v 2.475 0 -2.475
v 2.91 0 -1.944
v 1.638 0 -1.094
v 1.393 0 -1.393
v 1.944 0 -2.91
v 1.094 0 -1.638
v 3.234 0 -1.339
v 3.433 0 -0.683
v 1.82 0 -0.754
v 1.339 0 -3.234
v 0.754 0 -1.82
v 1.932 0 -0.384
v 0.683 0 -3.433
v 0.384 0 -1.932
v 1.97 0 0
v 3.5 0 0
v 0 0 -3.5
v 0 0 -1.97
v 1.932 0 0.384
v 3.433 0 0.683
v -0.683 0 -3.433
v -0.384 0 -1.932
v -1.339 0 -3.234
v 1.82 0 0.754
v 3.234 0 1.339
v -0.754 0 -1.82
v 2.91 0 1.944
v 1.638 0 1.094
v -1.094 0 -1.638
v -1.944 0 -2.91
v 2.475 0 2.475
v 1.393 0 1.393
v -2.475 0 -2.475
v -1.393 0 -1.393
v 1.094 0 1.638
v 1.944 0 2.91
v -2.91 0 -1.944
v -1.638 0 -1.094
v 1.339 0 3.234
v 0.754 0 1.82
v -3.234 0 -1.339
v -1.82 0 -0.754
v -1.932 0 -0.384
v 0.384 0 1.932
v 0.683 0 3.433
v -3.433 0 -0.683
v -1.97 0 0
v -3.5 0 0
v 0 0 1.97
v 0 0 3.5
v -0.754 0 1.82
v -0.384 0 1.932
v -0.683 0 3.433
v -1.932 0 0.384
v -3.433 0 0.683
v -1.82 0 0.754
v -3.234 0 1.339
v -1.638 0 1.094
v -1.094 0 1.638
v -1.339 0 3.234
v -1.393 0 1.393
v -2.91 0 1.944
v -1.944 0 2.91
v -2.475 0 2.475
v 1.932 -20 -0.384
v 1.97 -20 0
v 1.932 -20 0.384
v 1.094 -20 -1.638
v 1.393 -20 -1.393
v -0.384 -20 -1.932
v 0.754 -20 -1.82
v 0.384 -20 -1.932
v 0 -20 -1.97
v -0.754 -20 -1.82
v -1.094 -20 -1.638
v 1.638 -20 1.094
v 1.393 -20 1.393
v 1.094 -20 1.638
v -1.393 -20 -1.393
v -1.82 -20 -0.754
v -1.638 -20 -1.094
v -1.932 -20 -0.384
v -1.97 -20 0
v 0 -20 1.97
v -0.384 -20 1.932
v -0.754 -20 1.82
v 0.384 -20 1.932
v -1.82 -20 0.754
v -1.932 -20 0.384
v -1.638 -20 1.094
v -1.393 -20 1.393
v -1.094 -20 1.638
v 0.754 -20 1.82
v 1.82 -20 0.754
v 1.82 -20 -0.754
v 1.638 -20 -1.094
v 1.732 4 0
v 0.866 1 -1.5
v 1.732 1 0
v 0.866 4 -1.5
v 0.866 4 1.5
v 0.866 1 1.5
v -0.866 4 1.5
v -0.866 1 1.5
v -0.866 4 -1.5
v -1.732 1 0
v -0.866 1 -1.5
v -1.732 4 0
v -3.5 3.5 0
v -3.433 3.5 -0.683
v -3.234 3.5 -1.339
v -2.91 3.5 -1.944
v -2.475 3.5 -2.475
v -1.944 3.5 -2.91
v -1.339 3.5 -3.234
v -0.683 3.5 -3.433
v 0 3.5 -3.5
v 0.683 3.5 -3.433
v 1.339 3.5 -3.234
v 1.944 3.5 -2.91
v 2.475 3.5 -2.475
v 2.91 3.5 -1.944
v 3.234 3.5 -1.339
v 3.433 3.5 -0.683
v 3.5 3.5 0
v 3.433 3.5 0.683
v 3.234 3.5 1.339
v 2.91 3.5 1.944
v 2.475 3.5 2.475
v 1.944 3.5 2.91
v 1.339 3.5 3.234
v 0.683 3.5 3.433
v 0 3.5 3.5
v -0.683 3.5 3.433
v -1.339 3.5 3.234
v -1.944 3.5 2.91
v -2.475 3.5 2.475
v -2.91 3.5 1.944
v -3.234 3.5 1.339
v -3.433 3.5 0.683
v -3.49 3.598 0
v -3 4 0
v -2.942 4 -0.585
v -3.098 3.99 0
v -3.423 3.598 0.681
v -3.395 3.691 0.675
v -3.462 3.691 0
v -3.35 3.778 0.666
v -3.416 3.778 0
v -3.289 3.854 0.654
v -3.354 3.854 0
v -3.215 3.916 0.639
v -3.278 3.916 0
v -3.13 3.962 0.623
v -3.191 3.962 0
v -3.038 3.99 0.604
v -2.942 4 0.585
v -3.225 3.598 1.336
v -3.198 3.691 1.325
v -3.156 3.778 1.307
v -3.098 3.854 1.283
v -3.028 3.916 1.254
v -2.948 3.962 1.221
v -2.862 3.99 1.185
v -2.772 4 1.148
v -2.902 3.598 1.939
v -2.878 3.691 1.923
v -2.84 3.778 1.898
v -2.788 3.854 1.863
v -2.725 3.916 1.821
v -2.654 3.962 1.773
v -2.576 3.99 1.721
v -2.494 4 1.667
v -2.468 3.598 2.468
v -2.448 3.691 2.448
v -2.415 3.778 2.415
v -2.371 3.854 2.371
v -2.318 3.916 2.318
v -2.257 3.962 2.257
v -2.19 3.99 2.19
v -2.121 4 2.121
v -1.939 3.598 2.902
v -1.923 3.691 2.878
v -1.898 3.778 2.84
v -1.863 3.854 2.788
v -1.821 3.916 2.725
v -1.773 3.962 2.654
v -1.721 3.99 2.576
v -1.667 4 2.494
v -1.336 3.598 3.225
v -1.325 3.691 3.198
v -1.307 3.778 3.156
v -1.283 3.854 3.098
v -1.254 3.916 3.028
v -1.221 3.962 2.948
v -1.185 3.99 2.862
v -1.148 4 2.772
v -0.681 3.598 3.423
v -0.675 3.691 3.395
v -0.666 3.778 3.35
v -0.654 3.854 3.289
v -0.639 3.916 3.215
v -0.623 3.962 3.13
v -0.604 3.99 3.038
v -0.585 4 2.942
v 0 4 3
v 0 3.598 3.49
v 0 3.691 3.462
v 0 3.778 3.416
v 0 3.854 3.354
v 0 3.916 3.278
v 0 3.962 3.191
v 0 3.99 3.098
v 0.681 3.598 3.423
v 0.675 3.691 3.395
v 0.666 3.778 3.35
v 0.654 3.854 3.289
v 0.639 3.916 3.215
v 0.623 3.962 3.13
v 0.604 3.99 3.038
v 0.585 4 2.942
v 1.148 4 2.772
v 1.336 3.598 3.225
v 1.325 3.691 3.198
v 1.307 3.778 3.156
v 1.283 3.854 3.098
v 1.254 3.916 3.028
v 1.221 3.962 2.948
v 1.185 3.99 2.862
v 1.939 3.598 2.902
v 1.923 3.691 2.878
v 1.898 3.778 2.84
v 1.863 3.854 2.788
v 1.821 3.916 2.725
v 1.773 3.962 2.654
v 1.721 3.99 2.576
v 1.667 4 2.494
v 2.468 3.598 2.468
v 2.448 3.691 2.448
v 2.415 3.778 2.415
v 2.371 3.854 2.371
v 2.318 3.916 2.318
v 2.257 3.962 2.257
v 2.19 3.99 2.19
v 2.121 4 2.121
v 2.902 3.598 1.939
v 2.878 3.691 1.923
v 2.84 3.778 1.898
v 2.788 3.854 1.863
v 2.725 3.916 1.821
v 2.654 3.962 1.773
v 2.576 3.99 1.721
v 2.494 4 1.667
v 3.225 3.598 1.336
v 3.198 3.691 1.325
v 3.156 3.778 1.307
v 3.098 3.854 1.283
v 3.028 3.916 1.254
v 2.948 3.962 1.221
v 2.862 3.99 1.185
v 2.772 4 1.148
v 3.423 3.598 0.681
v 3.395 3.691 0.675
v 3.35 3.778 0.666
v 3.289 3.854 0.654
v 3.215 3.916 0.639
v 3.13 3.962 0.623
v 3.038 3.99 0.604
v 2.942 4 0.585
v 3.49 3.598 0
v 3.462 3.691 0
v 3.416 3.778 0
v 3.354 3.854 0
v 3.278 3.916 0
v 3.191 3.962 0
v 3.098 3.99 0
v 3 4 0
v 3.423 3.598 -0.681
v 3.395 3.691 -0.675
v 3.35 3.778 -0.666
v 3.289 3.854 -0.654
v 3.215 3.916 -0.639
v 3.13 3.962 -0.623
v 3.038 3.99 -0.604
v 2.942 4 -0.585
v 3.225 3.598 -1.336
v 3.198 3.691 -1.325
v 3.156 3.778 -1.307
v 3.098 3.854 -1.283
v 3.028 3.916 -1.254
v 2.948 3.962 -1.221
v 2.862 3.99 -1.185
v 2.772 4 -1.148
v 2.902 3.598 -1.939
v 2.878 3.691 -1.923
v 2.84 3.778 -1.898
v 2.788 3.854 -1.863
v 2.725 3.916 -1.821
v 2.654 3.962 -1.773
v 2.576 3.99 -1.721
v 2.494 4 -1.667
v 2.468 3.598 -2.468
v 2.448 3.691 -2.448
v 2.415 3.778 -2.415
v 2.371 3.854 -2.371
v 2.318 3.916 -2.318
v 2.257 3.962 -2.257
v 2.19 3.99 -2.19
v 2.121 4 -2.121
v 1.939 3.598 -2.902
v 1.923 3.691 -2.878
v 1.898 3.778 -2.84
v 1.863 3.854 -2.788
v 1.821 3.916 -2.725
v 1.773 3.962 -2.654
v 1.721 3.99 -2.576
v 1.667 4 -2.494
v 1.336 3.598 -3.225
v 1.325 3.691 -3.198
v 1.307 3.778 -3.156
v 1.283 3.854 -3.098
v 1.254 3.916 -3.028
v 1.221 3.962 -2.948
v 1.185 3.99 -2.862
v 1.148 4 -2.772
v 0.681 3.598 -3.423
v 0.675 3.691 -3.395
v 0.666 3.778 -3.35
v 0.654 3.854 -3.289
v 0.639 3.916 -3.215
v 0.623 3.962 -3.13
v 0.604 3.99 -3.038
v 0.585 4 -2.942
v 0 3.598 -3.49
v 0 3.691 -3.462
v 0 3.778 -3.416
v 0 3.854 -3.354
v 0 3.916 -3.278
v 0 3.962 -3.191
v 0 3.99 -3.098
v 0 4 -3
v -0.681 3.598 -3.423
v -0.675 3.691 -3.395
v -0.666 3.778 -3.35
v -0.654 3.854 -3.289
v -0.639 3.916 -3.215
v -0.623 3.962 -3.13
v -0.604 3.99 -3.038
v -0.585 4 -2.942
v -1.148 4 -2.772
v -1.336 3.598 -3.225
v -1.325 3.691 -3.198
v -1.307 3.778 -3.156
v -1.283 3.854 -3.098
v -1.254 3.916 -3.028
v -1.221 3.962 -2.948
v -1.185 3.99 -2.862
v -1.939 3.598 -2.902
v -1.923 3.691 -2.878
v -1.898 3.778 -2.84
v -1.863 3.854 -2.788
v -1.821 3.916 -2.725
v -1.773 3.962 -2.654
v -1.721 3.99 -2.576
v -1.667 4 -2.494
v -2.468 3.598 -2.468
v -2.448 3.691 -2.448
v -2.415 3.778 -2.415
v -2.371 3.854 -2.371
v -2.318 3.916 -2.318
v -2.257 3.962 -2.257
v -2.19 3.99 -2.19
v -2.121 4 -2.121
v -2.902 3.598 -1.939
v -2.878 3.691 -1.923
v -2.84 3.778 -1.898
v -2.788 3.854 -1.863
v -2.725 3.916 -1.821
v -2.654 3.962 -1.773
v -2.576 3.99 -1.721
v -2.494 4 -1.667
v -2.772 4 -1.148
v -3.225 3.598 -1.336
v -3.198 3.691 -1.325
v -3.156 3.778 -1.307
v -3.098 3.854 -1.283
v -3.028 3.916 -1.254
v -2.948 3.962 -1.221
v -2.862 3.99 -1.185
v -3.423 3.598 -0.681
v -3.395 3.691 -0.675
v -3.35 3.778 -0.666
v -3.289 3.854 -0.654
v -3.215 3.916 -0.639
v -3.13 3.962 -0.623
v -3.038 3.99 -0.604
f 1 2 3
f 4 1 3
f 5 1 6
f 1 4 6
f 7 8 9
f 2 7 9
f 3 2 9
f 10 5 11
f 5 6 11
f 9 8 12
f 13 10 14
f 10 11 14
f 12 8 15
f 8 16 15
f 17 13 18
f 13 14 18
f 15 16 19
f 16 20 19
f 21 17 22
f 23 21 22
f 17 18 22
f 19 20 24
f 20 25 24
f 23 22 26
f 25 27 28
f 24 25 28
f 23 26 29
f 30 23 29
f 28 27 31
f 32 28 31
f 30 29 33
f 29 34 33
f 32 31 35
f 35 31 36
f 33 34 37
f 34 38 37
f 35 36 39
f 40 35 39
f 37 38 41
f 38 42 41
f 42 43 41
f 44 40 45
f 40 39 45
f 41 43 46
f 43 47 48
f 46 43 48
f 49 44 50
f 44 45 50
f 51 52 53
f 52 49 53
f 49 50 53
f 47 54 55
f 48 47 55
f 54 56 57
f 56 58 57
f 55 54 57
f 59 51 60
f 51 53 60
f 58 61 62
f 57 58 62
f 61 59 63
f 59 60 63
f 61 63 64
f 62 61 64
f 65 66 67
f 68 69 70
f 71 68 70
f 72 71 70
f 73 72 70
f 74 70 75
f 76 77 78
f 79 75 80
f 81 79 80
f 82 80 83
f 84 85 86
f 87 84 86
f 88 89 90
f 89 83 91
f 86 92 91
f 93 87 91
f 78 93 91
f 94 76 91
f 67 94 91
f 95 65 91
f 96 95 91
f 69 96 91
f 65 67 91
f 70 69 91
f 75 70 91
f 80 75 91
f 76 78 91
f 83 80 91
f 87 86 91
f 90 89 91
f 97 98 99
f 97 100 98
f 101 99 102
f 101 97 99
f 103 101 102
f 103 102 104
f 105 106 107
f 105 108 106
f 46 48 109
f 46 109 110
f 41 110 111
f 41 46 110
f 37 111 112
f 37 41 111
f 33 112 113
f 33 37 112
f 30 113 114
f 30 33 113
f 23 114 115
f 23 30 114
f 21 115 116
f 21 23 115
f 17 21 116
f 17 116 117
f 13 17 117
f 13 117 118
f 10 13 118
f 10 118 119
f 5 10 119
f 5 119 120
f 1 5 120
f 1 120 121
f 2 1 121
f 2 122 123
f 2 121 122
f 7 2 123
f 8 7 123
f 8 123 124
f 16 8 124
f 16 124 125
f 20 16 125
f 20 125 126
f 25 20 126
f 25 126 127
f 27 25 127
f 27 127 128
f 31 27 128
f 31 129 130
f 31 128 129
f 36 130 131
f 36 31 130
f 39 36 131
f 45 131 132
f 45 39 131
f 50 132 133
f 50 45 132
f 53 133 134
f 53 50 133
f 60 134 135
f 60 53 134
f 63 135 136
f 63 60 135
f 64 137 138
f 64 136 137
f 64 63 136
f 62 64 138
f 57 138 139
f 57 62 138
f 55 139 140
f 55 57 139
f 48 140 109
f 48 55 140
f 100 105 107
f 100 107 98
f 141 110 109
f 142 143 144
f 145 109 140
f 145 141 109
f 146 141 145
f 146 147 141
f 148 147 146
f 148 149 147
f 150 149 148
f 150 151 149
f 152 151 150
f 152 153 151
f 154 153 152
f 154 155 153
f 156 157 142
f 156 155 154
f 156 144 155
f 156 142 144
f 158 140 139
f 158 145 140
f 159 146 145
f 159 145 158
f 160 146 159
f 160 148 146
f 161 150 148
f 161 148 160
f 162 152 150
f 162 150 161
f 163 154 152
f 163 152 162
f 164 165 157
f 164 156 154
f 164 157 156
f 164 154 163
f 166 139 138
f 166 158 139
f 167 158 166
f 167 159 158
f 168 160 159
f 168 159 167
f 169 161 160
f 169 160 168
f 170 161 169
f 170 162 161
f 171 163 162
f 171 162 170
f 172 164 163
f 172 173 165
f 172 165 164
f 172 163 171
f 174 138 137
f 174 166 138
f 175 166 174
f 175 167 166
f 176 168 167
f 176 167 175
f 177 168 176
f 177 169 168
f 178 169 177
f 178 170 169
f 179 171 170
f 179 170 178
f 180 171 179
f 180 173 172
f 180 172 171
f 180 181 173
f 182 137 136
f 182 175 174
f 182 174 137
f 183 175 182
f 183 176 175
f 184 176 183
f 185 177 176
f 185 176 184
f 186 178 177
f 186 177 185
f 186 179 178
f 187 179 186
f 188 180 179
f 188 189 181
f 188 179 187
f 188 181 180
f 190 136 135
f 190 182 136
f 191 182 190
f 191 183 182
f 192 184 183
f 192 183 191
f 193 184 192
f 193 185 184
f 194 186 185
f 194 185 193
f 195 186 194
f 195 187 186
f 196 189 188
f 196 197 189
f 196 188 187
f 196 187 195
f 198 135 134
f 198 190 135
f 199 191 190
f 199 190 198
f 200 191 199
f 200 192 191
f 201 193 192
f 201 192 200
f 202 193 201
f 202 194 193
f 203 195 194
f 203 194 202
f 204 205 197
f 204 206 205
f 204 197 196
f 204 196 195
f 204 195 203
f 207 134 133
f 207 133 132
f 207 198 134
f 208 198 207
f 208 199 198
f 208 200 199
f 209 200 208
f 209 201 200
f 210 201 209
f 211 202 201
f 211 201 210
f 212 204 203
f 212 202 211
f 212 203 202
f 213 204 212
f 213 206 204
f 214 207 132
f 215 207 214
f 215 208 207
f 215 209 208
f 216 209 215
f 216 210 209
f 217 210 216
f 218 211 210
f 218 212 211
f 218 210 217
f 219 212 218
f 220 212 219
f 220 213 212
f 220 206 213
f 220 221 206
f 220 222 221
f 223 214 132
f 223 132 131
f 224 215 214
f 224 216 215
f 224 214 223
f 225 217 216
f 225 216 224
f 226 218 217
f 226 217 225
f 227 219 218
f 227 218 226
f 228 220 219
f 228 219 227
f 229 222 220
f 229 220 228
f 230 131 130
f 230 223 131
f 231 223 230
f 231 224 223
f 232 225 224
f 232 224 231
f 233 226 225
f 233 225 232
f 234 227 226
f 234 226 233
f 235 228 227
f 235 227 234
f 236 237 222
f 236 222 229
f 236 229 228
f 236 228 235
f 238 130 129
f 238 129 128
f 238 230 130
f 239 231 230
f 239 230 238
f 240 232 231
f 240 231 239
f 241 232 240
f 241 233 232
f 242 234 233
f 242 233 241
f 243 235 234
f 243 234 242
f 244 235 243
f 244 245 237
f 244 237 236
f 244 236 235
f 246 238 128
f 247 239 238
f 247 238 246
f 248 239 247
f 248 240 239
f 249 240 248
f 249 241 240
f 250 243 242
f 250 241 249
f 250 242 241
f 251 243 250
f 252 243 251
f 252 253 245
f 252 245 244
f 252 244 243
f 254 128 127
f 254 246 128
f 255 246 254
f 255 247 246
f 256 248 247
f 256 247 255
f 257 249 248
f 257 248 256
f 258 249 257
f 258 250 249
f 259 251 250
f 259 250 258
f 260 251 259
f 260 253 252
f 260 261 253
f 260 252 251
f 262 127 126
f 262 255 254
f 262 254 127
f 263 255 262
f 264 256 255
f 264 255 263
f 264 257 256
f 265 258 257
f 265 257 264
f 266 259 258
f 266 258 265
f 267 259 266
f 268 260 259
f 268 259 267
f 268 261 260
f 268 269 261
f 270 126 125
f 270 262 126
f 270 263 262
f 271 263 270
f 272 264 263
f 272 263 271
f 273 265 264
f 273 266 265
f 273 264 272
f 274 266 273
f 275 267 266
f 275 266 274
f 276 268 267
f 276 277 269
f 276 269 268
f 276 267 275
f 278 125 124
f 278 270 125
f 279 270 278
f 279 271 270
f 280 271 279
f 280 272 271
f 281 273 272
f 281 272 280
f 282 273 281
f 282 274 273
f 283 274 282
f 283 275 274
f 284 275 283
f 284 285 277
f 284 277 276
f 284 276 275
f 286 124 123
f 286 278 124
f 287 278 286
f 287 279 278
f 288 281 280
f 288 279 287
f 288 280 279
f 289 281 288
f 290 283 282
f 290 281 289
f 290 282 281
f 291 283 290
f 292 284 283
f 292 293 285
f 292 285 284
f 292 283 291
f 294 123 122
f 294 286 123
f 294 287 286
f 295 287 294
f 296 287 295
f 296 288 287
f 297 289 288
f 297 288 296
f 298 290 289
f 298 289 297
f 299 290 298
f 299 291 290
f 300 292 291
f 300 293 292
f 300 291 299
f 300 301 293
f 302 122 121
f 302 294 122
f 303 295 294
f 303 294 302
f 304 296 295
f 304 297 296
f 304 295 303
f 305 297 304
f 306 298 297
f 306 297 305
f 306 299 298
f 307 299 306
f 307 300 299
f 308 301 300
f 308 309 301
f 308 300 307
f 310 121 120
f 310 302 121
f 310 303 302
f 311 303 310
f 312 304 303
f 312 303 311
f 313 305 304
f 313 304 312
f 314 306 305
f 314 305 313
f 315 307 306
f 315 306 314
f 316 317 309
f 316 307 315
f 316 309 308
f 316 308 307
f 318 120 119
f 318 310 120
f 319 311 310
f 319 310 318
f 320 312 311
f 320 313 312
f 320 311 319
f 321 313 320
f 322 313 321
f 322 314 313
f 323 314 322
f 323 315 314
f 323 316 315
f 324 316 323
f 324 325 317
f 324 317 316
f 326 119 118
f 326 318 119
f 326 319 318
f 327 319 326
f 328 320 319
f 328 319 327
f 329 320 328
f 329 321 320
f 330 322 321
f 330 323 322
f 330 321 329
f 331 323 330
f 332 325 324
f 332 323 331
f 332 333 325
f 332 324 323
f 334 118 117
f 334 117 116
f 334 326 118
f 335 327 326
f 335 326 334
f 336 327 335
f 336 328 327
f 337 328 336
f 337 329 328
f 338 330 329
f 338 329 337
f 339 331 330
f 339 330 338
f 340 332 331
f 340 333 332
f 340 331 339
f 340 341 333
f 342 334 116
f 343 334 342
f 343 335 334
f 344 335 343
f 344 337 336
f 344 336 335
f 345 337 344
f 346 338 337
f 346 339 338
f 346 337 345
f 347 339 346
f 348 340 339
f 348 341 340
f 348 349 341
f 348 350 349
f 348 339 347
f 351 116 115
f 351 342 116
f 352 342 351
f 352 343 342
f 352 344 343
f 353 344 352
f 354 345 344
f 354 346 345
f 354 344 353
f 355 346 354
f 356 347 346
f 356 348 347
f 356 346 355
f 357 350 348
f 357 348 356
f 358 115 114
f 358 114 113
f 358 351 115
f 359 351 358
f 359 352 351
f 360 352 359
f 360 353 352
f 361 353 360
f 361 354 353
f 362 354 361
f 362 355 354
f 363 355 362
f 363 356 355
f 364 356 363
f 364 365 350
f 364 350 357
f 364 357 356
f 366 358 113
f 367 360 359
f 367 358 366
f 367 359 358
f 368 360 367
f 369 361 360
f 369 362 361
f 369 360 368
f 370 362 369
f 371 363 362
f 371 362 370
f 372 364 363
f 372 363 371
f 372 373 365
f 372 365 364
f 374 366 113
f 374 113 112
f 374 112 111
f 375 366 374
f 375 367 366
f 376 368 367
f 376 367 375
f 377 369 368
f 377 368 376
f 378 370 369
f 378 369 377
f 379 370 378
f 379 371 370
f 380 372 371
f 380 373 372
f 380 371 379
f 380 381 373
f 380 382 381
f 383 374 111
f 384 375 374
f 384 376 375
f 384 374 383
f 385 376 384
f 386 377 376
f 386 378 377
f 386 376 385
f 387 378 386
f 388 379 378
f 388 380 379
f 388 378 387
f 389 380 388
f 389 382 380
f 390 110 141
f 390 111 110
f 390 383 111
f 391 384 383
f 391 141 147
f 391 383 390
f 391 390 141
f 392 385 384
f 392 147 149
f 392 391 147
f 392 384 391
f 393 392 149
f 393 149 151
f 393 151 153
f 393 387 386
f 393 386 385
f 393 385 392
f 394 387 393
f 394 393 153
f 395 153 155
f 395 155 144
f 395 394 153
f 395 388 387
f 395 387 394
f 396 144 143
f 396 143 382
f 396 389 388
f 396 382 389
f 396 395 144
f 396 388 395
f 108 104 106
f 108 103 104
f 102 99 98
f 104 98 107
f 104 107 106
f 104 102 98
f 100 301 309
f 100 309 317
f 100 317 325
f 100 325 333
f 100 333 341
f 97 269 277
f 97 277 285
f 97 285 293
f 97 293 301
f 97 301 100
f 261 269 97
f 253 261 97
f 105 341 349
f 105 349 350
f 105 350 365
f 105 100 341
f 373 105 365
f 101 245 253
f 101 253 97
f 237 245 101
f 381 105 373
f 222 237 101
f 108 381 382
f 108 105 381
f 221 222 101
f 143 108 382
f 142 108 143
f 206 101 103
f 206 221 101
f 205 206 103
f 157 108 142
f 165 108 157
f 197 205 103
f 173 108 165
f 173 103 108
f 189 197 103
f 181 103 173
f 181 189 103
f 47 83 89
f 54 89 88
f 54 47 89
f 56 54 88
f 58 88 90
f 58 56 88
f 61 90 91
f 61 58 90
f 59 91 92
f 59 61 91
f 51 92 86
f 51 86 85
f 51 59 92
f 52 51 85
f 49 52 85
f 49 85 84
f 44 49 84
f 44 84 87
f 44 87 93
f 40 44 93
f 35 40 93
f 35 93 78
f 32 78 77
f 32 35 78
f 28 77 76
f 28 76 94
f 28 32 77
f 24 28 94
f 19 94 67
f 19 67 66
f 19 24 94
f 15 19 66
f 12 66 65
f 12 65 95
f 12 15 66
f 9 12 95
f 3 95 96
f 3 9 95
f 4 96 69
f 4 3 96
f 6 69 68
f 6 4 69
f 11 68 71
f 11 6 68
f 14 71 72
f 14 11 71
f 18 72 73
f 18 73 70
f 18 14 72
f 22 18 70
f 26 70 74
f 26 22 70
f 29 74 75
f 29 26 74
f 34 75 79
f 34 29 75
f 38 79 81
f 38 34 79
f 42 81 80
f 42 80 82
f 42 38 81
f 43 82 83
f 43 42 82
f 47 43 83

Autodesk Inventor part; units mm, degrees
ref_plane "YZ Plane" through (0, 0, 0) normal (1, 0, 0) x (0, 1, 0)
ref_plane "XZ Plane" through (0, 0, 0) normal (0, 1, 0) x (-1, 0, 0)
ref_plane "XY Plane" through (0, 0, 0) normal (0, 0, 1) x (1, 0, 0)
sketch "Sketch1" plane through (0, 0, 0) normal (0, 1, 0) x (-1, 0, 0)
  circle A0 centre (0, 0) radius 1.97
  circle A1 centre (0, 0) radius 3.5
  line L0 (0.866, -1.5) -> (-0.866, -1.5)
  line L1 (-0.866, -1.5) -> (-1.7321, 0)
  line L2 (-1.7321, 0) -> (-0.866, 1.5)
  line L3 (-0.866, 1.5) -> (0.866, 1.5)
  line L4 (0.866, 1.5) -> (1.7321, 0)
  line L5 (1.7321, 0) -> (0.866, -1.5)
  dimension "d0" = 3.94
  dimension "d1" = 7
  dimension "d8" = 3
extrude "Extrusion1" add sketch "Sketch1" along normal blind 4 contours A0 | A1 | L0 L1 L2 L3 L4 L5
extrude "Extrusion2" add sketch "Sketch1" against normal blind 20 contours A0 | L0 L1 L2 L3 L4 L5
extrude "Extrusion3" cut sketch "Sketch1" against normal blind 3 from surface at 4 contours L0 L1 L2 L3 L4 L5
fillet "Fillet1" radius 0.5 1 edges at (3.5, 4, 0)
thread "Thread2" size "M5x0.8" class "6g" standard "ANSI Metric M Profile" full length
equation "\"d4\" = length"
equation "\"length\" = 20"
properties part number "M4x20"
